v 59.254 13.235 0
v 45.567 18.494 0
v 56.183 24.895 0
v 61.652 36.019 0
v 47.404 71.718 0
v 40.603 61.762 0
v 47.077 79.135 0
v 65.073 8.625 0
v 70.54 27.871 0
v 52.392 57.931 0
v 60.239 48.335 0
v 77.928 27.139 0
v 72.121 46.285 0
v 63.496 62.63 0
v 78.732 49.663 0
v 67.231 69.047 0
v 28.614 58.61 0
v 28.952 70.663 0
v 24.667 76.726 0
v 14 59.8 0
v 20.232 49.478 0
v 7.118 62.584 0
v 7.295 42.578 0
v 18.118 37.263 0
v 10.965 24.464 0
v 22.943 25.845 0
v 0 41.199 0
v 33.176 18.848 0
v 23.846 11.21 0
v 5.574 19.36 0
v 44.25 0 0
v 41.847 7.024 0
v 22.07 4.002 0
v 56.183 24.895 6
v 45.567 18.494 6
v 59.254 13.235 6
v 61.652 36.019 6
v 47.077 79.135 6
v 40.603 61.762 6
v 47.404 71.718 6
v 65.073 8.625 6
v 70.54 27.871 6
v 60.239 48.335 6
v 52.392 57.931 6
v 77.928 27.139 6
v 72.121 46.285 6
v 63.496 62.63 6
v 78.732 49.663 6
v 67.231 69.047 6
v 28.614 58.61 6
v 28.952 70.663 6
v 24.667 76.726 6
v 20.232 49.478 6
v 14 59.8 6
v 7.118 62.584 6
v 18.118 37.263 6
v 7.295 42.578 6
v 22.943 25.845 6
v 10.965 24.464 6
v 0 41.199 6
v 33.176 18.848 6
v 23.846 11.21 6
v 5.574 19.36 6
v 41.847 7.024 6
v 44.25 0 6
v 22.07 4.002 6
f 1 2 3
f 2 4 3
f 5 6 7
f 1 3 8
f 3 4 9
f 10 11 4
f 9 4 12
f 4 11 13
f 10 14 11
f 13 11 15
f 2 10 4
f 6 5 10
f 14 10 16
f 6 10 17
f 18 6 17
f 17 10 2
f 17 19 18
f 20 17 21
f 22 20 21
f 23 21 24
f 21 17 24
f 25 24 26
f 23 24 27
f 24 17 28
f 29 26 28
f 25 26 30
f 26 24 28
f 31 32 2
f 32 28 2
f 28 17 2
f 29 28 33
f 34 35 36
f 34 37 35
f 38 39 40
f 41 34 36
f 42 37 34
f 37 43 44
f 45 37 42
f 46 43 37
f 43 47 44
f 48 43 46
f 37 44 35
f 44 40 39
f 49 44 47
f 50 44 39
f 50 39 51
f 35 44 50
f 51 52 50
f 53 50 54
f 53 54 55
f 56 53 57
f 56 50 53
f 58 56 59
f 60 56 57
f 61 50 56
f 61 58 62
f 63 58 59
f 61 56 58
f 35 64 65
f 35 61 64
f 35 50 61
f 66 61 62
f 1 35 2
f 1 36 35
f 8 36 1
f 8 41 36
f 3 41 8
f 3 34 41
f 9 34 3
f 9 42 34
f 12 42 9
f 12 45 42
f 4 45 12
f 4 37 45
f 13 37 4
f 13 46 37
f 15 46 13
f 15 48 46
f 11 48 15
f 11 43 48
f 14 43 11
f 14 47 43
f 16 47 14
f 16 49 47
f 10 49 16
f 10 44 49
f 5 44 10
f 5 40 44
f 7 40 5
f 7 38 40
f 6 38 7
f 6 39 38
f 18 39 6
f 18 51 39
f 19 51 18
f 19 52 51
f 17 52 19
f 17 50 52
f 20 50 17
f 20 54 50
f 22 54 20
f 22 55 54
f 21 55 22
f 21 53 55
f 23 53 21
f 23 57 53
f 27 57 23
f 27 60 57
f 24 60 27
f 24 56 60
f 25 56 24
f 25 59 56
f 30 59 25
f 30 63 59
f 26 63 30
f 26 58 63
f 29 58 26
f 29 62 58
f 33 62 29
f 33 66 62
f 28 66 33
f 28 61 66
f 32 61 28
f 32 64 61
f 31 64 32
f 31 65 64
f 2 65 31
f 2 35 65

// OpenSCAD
$fn = 32;

// ----------------------------------------------------------------------
// Fan rotor section: 11 blades, 22 mm hub radius, 18 mm blades
// ----------------------------------------------------------------------

// --- parameters (mm) ---
profile_height = 6;       // extrusion height
profile_points = 33;      // points of the closed outline

profile = [[61.652, 36.019], [72.121, 46.285], [78.732, 49.663], [60.239, 48.335], [63.496, 62.63], [67.231, 69.047], [52.392, 57.931], [47.404, 71.718], [47.077, 79.135], [40.603, 61.762], [28.952, 70.663], [24.667, 76.726], [28.614, 58.61], [14, 59.8], [7.118, 62.584], [20.232, 49.478], [7.295, 42.578], [0, 41.199], [18.118, 37.263], [10.965, 24.464], [5.574, 19.36], [22.943, 25.845], [23.846, 11.21], [22.07, 4.002], [33.176, 18.848], [41.847, 7.024], [44.25, 0], [45.567, 18.494], [59.254, 13.235], [65.073, 8.625], [56.183, 24.895], [70.54, 27.871], [77.928, 27.139]];  // single closed polygon, 33 points, counter clockwise

// --- the one profile operation ---
linear_extrude(height = profile_height) polygon(points = profile);
